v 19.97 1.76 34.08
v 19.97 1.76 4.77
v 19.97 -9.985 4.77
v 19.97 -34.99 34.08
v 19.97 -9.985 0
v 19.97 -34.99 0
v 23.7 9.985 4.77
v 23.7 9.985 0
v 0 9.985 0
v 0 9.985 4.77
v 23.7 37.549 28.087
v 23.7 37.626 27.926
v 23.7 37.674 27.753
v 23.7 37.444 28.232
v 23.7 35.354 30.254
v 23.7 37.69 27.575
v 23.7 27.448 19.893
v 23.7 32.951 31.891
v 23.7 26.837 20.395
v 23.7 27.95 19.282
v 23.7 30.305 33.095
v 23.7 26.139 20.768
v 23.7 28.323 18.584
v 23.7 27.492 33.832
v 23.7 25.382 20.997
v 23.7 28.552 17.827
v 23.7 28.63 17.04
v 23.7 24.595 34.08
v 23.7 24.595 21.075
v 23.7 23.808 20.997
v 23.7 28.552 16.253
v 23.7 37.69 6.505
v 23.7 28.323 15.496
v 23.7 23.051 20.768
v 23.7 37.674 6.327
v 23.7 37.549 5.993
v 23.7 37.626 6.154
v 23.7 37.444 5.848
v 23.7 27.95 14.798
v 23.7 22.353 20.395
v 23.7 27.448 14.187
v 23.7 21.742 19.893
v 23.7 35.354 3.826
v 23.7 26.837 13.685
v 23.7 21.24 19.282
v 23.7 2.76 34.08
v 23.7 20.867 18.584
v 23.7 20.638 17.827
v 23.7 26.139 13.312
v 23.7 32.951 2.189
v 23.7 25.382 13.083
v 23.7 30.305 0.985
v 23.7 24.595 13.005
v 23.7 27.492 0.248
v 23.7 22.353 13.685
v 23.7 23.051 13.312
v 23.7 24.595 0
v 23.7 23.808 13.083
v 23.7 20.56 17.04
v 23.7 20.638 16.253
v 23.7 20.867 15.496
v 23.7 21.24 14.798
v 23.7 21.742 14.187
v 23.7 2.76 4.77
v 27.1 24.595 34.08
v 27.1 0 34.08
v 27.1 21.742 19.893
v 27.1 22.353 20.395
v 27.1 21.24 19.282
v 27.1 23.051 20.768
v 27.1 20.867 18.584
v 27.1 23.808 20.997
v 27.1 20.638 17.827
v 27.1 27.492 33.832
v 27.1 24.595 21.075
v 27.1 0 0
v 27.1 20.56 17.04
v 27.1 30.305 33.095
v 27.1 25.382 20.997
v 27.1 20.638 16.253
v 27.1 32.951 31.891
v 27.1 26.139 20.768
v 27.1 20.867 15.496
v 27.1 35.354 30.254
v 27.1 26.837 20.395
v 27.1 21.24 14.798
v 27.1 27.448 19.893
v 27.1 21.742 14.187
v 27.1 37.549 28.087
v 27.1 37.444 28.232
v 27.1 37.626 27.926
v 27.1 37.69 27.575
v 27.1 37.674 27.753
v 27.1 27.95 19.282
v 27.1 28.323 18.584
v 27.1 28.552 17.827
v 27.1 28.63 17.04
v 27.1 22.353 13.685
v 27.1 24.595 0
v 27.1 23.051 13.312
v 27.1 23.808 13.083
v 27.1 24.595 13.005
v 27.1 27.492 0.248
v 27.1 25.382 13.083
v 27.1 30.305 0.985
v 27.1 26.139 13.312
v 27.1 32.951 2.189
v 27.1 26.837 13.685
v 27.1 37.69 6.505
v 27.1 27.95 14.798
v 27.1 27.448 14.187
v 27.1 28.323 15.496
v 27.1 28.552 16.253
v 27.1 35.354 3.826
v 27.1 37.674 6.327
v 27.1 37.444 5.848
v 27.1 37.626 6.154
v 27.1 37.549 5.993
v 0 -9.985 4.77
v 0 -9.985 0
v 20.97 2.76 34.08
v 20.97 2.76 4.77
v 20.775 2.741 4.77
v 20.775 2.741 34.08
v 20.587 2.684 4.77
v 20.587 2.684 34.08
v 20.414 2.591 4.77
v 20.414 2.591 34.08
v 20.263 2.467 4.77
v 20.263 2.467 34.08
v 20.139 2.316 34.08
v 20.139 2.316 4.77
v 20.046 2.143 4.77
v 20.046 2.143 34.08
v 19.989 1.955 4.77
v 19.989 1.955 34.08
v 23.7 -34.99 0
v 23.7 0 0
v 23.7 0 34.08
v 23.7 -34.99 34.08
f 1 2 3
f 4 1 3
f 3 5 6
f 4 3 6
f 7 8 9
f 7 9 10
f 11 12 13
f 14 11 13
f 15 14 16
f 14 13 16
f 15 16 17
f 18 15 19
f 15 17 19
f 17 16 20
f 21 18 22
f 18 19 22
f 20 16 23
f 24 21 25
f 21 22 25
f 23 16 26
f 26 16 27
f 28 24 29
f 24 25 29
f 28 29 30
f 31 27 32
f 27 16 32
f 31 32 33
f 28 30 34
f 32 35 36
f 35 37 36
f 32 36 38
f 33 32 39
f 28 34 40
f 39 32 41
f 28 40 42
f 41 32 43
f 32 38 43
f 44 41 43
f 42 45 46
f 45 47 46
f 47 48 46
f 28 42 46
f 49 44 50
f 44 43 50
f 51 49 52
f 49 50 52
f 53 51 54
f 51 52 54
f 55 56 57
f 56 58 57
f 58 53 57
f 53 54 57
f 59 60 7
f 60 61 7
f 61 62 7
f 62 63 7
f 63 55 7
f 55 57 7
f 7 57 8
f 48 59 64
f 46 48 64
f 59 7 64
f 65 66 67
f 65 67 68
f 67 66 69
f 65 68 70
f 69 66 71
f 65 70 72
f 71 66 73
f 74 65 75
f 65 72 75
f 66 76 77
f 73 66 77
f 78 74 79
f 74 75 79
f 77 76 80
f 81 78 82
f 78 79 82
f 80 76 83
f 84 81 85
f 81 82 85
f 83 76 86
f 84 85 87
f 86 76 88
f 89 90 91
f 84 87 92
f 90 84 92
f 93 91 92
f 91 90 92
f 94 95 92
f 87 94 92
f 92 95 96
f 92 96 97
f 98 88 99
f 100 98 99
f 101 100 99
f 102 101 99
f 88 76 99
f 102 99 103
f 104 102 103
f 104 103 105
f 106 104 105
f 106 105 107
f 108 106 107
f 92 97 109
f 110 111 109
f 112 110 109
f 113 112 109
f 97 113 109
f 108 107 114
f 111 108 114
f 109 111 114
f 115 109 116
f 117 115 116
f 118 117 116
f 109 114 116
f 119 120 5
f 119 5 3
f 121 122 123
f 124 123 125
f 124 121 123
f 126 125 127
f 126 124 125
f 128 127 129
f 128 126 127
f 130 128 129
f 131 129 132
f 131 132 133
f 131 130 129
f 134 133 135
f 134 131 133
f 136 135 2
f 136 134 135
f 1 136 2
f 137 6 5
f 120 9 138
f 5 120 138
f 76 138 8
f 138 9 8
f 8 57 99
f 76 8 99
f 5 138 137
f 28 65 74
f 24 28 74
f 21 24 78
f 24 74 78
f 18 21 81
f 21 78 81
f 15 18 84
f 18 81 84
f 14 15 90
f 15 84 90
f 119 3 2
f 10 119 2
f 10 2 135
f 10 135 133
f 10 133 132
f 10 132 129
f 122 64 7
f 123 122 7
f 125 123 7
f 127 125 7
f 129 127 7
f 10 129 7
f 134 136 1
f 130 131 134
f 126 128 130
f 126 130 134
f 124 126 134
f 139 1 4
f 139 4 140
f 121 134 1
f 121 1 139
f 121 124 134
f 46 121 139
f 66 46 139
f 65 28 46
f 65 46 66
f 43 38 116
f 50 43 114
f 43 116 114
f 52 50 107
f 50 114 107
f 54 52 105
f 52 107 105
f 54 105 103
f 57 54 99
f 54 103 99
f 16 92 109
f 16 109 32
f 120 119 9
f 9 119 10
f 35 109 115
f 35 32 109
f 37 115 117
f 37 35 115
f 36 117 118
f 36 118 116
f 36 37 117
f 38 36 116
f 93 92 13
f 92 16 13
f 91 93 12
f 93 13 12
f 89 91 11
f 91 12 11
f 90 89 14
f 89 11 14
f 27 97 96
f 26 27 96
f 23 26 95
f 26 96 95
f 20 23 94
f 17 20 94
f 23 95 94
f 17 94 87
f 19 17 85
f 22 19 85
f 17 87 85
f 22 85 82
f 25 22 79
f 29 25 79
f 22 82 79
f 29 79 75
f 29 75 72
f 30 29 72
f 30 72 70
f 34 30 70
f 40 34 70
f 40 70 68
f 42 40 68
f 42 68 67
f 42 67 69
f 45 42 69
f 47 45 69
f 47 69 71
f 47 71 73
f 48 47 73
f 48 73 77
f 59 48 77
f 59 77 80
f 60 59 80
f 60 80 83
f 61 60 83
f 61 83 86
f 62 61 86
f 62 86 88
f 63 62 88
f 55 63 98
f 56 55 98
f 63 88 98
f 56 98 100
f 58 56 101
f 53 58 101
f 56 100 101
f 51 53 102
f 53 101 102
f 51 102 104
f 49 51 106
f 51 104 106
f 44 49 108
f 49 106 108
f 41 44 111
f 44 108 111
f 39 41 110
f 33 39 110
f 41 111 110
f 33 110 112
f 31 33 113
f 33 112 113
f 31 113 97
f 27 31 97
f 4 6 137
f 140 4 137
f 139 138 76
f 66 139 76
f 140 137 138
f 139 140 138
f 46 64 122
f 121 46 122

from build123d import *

# Parameters (mm, degrees)
F1_DEPTH = 34.08
F2_R     = 4.035
F3_DEPTH = 7.131
F4_R     = 1
F2_W     = 9.985
F2_H     = 4.77
F5_DEPTH = 27.1
F6_START = -3.4
F6_DEPTH = 23.7


with BuildPart() as f1:
    # F0 (on Top) → F1 (new body)
    with BuildSketch(Plane.XY):
        Polygon((27.1, 37.69), (23.7, 37.69), (23.7, 2.76), (19.97, 2.76), (19.97, -34.99), (23.7, -34.99), (23.7, 0), (27.1, 0), align=None)
    extrude(amount=F1_DEPTH)

    # F2 (on face) → F3 (cut, through all)
    with BuildSketch(Plane.YZ.offset(27.1)):
        with Locations((24.595, 17.04)):
            Circle(F2_R)
        with BuildLine():
            Line((37.69, 34.08), (24.595, 34.08))
            ThreePointArc((24.595, 34.08), (31.8257980304, 32.4697491828), (37.69, 27.9433286202))
            Line((37.69, 27.9433286202), (37.69, 34.08))
        make_face()
        with BuildLine():
            Line((37.69, 0), (37.69, 6.1366713798))
            ThreePointArc((37.69, 6.1366713798), (31.8257980304, 1.6102508172), (24.595, 0))
            Line((24.595, 0), (37.69, 0))
        make_face()
    extrude(amount=-F3_DEPTH, mode=Mode.SUBTRACT)

    # F4
    f4_edges = [f1.edges().sort_by_distance(p)[0] for p in [
        (25.4, 37.69, 6.136671),
        (25.4, 37.69, 27.943329),
        (19.97, 2.76, 17.04),
    ]]
    fillet(f4_edges, radius=F4_R)

    # F2 (on face) → F5 (join, through all)
    with BuildSketch(Plane.YZ.offset(27.1)):
        with Locations((4.9925, 2.385)):
            Rectangle(F2_W, F2_H)
    extrude(amount=-F5_DEPTH)

    # F2 (on face) → F6 (join)
    with BuildSketch(Plane.YZ.offset(27.1).offset(F6_START)):
        with Locations((-4.9925, 2.385)):
            Rectangle(F2_W, F2_H)
    extrude(amount=-F6_DEPTH)


solid = f1.part
